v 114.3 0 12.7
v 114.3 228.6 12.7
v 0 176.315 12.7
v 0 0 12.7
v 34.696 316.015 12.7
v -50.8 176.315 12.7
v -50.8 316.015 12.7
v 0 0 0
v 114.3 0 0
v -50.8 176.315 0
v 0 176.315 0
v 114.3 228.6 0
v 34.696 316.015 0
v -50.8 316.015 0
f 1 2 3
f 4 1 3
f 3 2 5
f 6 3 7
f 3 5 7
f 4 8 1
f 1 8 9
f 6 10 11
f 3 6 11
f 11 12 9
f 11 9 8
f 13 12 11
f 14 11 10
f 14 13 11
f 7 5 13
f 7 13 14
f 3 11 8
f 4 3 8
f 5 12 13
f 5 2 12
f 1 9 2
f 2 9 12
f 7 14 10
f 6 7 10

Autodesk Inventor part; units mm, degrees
ref_plane "YZ Plane" through (0, 0, 0) normal (1, 0, 0) x (0, 1, 0)
ref_plane "XZ Plane" through (0, 0, 0) normal (0, 1, 0) x (-1, 0, 0)
ref_plane "XY Plane" through (0, 0, 0) normal (0, 0, 1) x (1, 0, 0)
sketch "Sketch1" plane through (0, 0, 0) normal (0, 0, 1) x (1, 0, 0)
  line L0 (0, 0) -> (114.3, 0)
  line L1 (114.3, 0) -> (114.3, 228.6)
  line L2 (114.3, 228.6) -> (0, 228.6)
  line L3 (0, 228.6) -> (0, 0)
  dimension "d0" = 114.3
  dimension "d1" = 228.6
extrude "Extrusion1" add sketch "Sketch1" along normal blind 12.7
sketch "Sketch2" plane through (0, 0, 12.7) normal (0, 0, 1) x (1, 0, 0)
  point P0 (0, 0)
sketch "Sketch3" plane through (0, 0, 12.7) normal (0, 0, 1) x (1, 0, 0)
  line L0 (114.3, 0) -> (114.3, 228.6) projected
  line L1 (114.3, 228.6) -> (0, 354.1146)
  line L2 (0, 354.1146) -> (0, 228.6)
  line L3 (0, 228.6) -> (114.3, 228.6)
  point P0 (0, 0)
extrude "Extrusion2" add sketch "Sketch3" against normal blind 12.7
sketch "Sketch4" plane through (0, 0, 0) normal (0, 0, -1) x (-1, 0, 0)
  line L0 (0, 354.1146) -> (50.8, 354.1146)
  line L1 (50.8, 354.1146) -> (50.8, 176.3146)
  line L2 (50.8, 176.3146) -> (0, 176.3146)
  line L3 (0, 176.3146) -> (0, 354.1146)
  point P0 (0, 0)
  point P1 (0, 354.1146)
  dimension "d6" = 50.8
  dimension "d7" = 177.8
extrude "Extrusion3" add sketch "Sketch4" against normal blind 12.7
sketch "Sketch5" plane through (0, 0, 12.7) normal (0, 0, 1) x (1, 0, 0)
  line L0 (-50.8, 354.1146) -> (-50.8, 176.3146) projected
  line L1 (-50.8, 354.1146) -> (60.5424, 354.1146)
  line L2 (60.5424, 354.1146) -> (60.5424, 316.0146)
  line L3 (60.5424, 316.0146) -> (-50.8, 316.0146)
  line L4 (-50.8, 316.0146) -> (-50.8, 354.1146)
  point P0 (0, 0)
  dimension "d10" = 38.1
extrude "Extrusion4" cut sketch "Sketch5" against normal blind 25.4
properties part number "motor mount platform right side"
